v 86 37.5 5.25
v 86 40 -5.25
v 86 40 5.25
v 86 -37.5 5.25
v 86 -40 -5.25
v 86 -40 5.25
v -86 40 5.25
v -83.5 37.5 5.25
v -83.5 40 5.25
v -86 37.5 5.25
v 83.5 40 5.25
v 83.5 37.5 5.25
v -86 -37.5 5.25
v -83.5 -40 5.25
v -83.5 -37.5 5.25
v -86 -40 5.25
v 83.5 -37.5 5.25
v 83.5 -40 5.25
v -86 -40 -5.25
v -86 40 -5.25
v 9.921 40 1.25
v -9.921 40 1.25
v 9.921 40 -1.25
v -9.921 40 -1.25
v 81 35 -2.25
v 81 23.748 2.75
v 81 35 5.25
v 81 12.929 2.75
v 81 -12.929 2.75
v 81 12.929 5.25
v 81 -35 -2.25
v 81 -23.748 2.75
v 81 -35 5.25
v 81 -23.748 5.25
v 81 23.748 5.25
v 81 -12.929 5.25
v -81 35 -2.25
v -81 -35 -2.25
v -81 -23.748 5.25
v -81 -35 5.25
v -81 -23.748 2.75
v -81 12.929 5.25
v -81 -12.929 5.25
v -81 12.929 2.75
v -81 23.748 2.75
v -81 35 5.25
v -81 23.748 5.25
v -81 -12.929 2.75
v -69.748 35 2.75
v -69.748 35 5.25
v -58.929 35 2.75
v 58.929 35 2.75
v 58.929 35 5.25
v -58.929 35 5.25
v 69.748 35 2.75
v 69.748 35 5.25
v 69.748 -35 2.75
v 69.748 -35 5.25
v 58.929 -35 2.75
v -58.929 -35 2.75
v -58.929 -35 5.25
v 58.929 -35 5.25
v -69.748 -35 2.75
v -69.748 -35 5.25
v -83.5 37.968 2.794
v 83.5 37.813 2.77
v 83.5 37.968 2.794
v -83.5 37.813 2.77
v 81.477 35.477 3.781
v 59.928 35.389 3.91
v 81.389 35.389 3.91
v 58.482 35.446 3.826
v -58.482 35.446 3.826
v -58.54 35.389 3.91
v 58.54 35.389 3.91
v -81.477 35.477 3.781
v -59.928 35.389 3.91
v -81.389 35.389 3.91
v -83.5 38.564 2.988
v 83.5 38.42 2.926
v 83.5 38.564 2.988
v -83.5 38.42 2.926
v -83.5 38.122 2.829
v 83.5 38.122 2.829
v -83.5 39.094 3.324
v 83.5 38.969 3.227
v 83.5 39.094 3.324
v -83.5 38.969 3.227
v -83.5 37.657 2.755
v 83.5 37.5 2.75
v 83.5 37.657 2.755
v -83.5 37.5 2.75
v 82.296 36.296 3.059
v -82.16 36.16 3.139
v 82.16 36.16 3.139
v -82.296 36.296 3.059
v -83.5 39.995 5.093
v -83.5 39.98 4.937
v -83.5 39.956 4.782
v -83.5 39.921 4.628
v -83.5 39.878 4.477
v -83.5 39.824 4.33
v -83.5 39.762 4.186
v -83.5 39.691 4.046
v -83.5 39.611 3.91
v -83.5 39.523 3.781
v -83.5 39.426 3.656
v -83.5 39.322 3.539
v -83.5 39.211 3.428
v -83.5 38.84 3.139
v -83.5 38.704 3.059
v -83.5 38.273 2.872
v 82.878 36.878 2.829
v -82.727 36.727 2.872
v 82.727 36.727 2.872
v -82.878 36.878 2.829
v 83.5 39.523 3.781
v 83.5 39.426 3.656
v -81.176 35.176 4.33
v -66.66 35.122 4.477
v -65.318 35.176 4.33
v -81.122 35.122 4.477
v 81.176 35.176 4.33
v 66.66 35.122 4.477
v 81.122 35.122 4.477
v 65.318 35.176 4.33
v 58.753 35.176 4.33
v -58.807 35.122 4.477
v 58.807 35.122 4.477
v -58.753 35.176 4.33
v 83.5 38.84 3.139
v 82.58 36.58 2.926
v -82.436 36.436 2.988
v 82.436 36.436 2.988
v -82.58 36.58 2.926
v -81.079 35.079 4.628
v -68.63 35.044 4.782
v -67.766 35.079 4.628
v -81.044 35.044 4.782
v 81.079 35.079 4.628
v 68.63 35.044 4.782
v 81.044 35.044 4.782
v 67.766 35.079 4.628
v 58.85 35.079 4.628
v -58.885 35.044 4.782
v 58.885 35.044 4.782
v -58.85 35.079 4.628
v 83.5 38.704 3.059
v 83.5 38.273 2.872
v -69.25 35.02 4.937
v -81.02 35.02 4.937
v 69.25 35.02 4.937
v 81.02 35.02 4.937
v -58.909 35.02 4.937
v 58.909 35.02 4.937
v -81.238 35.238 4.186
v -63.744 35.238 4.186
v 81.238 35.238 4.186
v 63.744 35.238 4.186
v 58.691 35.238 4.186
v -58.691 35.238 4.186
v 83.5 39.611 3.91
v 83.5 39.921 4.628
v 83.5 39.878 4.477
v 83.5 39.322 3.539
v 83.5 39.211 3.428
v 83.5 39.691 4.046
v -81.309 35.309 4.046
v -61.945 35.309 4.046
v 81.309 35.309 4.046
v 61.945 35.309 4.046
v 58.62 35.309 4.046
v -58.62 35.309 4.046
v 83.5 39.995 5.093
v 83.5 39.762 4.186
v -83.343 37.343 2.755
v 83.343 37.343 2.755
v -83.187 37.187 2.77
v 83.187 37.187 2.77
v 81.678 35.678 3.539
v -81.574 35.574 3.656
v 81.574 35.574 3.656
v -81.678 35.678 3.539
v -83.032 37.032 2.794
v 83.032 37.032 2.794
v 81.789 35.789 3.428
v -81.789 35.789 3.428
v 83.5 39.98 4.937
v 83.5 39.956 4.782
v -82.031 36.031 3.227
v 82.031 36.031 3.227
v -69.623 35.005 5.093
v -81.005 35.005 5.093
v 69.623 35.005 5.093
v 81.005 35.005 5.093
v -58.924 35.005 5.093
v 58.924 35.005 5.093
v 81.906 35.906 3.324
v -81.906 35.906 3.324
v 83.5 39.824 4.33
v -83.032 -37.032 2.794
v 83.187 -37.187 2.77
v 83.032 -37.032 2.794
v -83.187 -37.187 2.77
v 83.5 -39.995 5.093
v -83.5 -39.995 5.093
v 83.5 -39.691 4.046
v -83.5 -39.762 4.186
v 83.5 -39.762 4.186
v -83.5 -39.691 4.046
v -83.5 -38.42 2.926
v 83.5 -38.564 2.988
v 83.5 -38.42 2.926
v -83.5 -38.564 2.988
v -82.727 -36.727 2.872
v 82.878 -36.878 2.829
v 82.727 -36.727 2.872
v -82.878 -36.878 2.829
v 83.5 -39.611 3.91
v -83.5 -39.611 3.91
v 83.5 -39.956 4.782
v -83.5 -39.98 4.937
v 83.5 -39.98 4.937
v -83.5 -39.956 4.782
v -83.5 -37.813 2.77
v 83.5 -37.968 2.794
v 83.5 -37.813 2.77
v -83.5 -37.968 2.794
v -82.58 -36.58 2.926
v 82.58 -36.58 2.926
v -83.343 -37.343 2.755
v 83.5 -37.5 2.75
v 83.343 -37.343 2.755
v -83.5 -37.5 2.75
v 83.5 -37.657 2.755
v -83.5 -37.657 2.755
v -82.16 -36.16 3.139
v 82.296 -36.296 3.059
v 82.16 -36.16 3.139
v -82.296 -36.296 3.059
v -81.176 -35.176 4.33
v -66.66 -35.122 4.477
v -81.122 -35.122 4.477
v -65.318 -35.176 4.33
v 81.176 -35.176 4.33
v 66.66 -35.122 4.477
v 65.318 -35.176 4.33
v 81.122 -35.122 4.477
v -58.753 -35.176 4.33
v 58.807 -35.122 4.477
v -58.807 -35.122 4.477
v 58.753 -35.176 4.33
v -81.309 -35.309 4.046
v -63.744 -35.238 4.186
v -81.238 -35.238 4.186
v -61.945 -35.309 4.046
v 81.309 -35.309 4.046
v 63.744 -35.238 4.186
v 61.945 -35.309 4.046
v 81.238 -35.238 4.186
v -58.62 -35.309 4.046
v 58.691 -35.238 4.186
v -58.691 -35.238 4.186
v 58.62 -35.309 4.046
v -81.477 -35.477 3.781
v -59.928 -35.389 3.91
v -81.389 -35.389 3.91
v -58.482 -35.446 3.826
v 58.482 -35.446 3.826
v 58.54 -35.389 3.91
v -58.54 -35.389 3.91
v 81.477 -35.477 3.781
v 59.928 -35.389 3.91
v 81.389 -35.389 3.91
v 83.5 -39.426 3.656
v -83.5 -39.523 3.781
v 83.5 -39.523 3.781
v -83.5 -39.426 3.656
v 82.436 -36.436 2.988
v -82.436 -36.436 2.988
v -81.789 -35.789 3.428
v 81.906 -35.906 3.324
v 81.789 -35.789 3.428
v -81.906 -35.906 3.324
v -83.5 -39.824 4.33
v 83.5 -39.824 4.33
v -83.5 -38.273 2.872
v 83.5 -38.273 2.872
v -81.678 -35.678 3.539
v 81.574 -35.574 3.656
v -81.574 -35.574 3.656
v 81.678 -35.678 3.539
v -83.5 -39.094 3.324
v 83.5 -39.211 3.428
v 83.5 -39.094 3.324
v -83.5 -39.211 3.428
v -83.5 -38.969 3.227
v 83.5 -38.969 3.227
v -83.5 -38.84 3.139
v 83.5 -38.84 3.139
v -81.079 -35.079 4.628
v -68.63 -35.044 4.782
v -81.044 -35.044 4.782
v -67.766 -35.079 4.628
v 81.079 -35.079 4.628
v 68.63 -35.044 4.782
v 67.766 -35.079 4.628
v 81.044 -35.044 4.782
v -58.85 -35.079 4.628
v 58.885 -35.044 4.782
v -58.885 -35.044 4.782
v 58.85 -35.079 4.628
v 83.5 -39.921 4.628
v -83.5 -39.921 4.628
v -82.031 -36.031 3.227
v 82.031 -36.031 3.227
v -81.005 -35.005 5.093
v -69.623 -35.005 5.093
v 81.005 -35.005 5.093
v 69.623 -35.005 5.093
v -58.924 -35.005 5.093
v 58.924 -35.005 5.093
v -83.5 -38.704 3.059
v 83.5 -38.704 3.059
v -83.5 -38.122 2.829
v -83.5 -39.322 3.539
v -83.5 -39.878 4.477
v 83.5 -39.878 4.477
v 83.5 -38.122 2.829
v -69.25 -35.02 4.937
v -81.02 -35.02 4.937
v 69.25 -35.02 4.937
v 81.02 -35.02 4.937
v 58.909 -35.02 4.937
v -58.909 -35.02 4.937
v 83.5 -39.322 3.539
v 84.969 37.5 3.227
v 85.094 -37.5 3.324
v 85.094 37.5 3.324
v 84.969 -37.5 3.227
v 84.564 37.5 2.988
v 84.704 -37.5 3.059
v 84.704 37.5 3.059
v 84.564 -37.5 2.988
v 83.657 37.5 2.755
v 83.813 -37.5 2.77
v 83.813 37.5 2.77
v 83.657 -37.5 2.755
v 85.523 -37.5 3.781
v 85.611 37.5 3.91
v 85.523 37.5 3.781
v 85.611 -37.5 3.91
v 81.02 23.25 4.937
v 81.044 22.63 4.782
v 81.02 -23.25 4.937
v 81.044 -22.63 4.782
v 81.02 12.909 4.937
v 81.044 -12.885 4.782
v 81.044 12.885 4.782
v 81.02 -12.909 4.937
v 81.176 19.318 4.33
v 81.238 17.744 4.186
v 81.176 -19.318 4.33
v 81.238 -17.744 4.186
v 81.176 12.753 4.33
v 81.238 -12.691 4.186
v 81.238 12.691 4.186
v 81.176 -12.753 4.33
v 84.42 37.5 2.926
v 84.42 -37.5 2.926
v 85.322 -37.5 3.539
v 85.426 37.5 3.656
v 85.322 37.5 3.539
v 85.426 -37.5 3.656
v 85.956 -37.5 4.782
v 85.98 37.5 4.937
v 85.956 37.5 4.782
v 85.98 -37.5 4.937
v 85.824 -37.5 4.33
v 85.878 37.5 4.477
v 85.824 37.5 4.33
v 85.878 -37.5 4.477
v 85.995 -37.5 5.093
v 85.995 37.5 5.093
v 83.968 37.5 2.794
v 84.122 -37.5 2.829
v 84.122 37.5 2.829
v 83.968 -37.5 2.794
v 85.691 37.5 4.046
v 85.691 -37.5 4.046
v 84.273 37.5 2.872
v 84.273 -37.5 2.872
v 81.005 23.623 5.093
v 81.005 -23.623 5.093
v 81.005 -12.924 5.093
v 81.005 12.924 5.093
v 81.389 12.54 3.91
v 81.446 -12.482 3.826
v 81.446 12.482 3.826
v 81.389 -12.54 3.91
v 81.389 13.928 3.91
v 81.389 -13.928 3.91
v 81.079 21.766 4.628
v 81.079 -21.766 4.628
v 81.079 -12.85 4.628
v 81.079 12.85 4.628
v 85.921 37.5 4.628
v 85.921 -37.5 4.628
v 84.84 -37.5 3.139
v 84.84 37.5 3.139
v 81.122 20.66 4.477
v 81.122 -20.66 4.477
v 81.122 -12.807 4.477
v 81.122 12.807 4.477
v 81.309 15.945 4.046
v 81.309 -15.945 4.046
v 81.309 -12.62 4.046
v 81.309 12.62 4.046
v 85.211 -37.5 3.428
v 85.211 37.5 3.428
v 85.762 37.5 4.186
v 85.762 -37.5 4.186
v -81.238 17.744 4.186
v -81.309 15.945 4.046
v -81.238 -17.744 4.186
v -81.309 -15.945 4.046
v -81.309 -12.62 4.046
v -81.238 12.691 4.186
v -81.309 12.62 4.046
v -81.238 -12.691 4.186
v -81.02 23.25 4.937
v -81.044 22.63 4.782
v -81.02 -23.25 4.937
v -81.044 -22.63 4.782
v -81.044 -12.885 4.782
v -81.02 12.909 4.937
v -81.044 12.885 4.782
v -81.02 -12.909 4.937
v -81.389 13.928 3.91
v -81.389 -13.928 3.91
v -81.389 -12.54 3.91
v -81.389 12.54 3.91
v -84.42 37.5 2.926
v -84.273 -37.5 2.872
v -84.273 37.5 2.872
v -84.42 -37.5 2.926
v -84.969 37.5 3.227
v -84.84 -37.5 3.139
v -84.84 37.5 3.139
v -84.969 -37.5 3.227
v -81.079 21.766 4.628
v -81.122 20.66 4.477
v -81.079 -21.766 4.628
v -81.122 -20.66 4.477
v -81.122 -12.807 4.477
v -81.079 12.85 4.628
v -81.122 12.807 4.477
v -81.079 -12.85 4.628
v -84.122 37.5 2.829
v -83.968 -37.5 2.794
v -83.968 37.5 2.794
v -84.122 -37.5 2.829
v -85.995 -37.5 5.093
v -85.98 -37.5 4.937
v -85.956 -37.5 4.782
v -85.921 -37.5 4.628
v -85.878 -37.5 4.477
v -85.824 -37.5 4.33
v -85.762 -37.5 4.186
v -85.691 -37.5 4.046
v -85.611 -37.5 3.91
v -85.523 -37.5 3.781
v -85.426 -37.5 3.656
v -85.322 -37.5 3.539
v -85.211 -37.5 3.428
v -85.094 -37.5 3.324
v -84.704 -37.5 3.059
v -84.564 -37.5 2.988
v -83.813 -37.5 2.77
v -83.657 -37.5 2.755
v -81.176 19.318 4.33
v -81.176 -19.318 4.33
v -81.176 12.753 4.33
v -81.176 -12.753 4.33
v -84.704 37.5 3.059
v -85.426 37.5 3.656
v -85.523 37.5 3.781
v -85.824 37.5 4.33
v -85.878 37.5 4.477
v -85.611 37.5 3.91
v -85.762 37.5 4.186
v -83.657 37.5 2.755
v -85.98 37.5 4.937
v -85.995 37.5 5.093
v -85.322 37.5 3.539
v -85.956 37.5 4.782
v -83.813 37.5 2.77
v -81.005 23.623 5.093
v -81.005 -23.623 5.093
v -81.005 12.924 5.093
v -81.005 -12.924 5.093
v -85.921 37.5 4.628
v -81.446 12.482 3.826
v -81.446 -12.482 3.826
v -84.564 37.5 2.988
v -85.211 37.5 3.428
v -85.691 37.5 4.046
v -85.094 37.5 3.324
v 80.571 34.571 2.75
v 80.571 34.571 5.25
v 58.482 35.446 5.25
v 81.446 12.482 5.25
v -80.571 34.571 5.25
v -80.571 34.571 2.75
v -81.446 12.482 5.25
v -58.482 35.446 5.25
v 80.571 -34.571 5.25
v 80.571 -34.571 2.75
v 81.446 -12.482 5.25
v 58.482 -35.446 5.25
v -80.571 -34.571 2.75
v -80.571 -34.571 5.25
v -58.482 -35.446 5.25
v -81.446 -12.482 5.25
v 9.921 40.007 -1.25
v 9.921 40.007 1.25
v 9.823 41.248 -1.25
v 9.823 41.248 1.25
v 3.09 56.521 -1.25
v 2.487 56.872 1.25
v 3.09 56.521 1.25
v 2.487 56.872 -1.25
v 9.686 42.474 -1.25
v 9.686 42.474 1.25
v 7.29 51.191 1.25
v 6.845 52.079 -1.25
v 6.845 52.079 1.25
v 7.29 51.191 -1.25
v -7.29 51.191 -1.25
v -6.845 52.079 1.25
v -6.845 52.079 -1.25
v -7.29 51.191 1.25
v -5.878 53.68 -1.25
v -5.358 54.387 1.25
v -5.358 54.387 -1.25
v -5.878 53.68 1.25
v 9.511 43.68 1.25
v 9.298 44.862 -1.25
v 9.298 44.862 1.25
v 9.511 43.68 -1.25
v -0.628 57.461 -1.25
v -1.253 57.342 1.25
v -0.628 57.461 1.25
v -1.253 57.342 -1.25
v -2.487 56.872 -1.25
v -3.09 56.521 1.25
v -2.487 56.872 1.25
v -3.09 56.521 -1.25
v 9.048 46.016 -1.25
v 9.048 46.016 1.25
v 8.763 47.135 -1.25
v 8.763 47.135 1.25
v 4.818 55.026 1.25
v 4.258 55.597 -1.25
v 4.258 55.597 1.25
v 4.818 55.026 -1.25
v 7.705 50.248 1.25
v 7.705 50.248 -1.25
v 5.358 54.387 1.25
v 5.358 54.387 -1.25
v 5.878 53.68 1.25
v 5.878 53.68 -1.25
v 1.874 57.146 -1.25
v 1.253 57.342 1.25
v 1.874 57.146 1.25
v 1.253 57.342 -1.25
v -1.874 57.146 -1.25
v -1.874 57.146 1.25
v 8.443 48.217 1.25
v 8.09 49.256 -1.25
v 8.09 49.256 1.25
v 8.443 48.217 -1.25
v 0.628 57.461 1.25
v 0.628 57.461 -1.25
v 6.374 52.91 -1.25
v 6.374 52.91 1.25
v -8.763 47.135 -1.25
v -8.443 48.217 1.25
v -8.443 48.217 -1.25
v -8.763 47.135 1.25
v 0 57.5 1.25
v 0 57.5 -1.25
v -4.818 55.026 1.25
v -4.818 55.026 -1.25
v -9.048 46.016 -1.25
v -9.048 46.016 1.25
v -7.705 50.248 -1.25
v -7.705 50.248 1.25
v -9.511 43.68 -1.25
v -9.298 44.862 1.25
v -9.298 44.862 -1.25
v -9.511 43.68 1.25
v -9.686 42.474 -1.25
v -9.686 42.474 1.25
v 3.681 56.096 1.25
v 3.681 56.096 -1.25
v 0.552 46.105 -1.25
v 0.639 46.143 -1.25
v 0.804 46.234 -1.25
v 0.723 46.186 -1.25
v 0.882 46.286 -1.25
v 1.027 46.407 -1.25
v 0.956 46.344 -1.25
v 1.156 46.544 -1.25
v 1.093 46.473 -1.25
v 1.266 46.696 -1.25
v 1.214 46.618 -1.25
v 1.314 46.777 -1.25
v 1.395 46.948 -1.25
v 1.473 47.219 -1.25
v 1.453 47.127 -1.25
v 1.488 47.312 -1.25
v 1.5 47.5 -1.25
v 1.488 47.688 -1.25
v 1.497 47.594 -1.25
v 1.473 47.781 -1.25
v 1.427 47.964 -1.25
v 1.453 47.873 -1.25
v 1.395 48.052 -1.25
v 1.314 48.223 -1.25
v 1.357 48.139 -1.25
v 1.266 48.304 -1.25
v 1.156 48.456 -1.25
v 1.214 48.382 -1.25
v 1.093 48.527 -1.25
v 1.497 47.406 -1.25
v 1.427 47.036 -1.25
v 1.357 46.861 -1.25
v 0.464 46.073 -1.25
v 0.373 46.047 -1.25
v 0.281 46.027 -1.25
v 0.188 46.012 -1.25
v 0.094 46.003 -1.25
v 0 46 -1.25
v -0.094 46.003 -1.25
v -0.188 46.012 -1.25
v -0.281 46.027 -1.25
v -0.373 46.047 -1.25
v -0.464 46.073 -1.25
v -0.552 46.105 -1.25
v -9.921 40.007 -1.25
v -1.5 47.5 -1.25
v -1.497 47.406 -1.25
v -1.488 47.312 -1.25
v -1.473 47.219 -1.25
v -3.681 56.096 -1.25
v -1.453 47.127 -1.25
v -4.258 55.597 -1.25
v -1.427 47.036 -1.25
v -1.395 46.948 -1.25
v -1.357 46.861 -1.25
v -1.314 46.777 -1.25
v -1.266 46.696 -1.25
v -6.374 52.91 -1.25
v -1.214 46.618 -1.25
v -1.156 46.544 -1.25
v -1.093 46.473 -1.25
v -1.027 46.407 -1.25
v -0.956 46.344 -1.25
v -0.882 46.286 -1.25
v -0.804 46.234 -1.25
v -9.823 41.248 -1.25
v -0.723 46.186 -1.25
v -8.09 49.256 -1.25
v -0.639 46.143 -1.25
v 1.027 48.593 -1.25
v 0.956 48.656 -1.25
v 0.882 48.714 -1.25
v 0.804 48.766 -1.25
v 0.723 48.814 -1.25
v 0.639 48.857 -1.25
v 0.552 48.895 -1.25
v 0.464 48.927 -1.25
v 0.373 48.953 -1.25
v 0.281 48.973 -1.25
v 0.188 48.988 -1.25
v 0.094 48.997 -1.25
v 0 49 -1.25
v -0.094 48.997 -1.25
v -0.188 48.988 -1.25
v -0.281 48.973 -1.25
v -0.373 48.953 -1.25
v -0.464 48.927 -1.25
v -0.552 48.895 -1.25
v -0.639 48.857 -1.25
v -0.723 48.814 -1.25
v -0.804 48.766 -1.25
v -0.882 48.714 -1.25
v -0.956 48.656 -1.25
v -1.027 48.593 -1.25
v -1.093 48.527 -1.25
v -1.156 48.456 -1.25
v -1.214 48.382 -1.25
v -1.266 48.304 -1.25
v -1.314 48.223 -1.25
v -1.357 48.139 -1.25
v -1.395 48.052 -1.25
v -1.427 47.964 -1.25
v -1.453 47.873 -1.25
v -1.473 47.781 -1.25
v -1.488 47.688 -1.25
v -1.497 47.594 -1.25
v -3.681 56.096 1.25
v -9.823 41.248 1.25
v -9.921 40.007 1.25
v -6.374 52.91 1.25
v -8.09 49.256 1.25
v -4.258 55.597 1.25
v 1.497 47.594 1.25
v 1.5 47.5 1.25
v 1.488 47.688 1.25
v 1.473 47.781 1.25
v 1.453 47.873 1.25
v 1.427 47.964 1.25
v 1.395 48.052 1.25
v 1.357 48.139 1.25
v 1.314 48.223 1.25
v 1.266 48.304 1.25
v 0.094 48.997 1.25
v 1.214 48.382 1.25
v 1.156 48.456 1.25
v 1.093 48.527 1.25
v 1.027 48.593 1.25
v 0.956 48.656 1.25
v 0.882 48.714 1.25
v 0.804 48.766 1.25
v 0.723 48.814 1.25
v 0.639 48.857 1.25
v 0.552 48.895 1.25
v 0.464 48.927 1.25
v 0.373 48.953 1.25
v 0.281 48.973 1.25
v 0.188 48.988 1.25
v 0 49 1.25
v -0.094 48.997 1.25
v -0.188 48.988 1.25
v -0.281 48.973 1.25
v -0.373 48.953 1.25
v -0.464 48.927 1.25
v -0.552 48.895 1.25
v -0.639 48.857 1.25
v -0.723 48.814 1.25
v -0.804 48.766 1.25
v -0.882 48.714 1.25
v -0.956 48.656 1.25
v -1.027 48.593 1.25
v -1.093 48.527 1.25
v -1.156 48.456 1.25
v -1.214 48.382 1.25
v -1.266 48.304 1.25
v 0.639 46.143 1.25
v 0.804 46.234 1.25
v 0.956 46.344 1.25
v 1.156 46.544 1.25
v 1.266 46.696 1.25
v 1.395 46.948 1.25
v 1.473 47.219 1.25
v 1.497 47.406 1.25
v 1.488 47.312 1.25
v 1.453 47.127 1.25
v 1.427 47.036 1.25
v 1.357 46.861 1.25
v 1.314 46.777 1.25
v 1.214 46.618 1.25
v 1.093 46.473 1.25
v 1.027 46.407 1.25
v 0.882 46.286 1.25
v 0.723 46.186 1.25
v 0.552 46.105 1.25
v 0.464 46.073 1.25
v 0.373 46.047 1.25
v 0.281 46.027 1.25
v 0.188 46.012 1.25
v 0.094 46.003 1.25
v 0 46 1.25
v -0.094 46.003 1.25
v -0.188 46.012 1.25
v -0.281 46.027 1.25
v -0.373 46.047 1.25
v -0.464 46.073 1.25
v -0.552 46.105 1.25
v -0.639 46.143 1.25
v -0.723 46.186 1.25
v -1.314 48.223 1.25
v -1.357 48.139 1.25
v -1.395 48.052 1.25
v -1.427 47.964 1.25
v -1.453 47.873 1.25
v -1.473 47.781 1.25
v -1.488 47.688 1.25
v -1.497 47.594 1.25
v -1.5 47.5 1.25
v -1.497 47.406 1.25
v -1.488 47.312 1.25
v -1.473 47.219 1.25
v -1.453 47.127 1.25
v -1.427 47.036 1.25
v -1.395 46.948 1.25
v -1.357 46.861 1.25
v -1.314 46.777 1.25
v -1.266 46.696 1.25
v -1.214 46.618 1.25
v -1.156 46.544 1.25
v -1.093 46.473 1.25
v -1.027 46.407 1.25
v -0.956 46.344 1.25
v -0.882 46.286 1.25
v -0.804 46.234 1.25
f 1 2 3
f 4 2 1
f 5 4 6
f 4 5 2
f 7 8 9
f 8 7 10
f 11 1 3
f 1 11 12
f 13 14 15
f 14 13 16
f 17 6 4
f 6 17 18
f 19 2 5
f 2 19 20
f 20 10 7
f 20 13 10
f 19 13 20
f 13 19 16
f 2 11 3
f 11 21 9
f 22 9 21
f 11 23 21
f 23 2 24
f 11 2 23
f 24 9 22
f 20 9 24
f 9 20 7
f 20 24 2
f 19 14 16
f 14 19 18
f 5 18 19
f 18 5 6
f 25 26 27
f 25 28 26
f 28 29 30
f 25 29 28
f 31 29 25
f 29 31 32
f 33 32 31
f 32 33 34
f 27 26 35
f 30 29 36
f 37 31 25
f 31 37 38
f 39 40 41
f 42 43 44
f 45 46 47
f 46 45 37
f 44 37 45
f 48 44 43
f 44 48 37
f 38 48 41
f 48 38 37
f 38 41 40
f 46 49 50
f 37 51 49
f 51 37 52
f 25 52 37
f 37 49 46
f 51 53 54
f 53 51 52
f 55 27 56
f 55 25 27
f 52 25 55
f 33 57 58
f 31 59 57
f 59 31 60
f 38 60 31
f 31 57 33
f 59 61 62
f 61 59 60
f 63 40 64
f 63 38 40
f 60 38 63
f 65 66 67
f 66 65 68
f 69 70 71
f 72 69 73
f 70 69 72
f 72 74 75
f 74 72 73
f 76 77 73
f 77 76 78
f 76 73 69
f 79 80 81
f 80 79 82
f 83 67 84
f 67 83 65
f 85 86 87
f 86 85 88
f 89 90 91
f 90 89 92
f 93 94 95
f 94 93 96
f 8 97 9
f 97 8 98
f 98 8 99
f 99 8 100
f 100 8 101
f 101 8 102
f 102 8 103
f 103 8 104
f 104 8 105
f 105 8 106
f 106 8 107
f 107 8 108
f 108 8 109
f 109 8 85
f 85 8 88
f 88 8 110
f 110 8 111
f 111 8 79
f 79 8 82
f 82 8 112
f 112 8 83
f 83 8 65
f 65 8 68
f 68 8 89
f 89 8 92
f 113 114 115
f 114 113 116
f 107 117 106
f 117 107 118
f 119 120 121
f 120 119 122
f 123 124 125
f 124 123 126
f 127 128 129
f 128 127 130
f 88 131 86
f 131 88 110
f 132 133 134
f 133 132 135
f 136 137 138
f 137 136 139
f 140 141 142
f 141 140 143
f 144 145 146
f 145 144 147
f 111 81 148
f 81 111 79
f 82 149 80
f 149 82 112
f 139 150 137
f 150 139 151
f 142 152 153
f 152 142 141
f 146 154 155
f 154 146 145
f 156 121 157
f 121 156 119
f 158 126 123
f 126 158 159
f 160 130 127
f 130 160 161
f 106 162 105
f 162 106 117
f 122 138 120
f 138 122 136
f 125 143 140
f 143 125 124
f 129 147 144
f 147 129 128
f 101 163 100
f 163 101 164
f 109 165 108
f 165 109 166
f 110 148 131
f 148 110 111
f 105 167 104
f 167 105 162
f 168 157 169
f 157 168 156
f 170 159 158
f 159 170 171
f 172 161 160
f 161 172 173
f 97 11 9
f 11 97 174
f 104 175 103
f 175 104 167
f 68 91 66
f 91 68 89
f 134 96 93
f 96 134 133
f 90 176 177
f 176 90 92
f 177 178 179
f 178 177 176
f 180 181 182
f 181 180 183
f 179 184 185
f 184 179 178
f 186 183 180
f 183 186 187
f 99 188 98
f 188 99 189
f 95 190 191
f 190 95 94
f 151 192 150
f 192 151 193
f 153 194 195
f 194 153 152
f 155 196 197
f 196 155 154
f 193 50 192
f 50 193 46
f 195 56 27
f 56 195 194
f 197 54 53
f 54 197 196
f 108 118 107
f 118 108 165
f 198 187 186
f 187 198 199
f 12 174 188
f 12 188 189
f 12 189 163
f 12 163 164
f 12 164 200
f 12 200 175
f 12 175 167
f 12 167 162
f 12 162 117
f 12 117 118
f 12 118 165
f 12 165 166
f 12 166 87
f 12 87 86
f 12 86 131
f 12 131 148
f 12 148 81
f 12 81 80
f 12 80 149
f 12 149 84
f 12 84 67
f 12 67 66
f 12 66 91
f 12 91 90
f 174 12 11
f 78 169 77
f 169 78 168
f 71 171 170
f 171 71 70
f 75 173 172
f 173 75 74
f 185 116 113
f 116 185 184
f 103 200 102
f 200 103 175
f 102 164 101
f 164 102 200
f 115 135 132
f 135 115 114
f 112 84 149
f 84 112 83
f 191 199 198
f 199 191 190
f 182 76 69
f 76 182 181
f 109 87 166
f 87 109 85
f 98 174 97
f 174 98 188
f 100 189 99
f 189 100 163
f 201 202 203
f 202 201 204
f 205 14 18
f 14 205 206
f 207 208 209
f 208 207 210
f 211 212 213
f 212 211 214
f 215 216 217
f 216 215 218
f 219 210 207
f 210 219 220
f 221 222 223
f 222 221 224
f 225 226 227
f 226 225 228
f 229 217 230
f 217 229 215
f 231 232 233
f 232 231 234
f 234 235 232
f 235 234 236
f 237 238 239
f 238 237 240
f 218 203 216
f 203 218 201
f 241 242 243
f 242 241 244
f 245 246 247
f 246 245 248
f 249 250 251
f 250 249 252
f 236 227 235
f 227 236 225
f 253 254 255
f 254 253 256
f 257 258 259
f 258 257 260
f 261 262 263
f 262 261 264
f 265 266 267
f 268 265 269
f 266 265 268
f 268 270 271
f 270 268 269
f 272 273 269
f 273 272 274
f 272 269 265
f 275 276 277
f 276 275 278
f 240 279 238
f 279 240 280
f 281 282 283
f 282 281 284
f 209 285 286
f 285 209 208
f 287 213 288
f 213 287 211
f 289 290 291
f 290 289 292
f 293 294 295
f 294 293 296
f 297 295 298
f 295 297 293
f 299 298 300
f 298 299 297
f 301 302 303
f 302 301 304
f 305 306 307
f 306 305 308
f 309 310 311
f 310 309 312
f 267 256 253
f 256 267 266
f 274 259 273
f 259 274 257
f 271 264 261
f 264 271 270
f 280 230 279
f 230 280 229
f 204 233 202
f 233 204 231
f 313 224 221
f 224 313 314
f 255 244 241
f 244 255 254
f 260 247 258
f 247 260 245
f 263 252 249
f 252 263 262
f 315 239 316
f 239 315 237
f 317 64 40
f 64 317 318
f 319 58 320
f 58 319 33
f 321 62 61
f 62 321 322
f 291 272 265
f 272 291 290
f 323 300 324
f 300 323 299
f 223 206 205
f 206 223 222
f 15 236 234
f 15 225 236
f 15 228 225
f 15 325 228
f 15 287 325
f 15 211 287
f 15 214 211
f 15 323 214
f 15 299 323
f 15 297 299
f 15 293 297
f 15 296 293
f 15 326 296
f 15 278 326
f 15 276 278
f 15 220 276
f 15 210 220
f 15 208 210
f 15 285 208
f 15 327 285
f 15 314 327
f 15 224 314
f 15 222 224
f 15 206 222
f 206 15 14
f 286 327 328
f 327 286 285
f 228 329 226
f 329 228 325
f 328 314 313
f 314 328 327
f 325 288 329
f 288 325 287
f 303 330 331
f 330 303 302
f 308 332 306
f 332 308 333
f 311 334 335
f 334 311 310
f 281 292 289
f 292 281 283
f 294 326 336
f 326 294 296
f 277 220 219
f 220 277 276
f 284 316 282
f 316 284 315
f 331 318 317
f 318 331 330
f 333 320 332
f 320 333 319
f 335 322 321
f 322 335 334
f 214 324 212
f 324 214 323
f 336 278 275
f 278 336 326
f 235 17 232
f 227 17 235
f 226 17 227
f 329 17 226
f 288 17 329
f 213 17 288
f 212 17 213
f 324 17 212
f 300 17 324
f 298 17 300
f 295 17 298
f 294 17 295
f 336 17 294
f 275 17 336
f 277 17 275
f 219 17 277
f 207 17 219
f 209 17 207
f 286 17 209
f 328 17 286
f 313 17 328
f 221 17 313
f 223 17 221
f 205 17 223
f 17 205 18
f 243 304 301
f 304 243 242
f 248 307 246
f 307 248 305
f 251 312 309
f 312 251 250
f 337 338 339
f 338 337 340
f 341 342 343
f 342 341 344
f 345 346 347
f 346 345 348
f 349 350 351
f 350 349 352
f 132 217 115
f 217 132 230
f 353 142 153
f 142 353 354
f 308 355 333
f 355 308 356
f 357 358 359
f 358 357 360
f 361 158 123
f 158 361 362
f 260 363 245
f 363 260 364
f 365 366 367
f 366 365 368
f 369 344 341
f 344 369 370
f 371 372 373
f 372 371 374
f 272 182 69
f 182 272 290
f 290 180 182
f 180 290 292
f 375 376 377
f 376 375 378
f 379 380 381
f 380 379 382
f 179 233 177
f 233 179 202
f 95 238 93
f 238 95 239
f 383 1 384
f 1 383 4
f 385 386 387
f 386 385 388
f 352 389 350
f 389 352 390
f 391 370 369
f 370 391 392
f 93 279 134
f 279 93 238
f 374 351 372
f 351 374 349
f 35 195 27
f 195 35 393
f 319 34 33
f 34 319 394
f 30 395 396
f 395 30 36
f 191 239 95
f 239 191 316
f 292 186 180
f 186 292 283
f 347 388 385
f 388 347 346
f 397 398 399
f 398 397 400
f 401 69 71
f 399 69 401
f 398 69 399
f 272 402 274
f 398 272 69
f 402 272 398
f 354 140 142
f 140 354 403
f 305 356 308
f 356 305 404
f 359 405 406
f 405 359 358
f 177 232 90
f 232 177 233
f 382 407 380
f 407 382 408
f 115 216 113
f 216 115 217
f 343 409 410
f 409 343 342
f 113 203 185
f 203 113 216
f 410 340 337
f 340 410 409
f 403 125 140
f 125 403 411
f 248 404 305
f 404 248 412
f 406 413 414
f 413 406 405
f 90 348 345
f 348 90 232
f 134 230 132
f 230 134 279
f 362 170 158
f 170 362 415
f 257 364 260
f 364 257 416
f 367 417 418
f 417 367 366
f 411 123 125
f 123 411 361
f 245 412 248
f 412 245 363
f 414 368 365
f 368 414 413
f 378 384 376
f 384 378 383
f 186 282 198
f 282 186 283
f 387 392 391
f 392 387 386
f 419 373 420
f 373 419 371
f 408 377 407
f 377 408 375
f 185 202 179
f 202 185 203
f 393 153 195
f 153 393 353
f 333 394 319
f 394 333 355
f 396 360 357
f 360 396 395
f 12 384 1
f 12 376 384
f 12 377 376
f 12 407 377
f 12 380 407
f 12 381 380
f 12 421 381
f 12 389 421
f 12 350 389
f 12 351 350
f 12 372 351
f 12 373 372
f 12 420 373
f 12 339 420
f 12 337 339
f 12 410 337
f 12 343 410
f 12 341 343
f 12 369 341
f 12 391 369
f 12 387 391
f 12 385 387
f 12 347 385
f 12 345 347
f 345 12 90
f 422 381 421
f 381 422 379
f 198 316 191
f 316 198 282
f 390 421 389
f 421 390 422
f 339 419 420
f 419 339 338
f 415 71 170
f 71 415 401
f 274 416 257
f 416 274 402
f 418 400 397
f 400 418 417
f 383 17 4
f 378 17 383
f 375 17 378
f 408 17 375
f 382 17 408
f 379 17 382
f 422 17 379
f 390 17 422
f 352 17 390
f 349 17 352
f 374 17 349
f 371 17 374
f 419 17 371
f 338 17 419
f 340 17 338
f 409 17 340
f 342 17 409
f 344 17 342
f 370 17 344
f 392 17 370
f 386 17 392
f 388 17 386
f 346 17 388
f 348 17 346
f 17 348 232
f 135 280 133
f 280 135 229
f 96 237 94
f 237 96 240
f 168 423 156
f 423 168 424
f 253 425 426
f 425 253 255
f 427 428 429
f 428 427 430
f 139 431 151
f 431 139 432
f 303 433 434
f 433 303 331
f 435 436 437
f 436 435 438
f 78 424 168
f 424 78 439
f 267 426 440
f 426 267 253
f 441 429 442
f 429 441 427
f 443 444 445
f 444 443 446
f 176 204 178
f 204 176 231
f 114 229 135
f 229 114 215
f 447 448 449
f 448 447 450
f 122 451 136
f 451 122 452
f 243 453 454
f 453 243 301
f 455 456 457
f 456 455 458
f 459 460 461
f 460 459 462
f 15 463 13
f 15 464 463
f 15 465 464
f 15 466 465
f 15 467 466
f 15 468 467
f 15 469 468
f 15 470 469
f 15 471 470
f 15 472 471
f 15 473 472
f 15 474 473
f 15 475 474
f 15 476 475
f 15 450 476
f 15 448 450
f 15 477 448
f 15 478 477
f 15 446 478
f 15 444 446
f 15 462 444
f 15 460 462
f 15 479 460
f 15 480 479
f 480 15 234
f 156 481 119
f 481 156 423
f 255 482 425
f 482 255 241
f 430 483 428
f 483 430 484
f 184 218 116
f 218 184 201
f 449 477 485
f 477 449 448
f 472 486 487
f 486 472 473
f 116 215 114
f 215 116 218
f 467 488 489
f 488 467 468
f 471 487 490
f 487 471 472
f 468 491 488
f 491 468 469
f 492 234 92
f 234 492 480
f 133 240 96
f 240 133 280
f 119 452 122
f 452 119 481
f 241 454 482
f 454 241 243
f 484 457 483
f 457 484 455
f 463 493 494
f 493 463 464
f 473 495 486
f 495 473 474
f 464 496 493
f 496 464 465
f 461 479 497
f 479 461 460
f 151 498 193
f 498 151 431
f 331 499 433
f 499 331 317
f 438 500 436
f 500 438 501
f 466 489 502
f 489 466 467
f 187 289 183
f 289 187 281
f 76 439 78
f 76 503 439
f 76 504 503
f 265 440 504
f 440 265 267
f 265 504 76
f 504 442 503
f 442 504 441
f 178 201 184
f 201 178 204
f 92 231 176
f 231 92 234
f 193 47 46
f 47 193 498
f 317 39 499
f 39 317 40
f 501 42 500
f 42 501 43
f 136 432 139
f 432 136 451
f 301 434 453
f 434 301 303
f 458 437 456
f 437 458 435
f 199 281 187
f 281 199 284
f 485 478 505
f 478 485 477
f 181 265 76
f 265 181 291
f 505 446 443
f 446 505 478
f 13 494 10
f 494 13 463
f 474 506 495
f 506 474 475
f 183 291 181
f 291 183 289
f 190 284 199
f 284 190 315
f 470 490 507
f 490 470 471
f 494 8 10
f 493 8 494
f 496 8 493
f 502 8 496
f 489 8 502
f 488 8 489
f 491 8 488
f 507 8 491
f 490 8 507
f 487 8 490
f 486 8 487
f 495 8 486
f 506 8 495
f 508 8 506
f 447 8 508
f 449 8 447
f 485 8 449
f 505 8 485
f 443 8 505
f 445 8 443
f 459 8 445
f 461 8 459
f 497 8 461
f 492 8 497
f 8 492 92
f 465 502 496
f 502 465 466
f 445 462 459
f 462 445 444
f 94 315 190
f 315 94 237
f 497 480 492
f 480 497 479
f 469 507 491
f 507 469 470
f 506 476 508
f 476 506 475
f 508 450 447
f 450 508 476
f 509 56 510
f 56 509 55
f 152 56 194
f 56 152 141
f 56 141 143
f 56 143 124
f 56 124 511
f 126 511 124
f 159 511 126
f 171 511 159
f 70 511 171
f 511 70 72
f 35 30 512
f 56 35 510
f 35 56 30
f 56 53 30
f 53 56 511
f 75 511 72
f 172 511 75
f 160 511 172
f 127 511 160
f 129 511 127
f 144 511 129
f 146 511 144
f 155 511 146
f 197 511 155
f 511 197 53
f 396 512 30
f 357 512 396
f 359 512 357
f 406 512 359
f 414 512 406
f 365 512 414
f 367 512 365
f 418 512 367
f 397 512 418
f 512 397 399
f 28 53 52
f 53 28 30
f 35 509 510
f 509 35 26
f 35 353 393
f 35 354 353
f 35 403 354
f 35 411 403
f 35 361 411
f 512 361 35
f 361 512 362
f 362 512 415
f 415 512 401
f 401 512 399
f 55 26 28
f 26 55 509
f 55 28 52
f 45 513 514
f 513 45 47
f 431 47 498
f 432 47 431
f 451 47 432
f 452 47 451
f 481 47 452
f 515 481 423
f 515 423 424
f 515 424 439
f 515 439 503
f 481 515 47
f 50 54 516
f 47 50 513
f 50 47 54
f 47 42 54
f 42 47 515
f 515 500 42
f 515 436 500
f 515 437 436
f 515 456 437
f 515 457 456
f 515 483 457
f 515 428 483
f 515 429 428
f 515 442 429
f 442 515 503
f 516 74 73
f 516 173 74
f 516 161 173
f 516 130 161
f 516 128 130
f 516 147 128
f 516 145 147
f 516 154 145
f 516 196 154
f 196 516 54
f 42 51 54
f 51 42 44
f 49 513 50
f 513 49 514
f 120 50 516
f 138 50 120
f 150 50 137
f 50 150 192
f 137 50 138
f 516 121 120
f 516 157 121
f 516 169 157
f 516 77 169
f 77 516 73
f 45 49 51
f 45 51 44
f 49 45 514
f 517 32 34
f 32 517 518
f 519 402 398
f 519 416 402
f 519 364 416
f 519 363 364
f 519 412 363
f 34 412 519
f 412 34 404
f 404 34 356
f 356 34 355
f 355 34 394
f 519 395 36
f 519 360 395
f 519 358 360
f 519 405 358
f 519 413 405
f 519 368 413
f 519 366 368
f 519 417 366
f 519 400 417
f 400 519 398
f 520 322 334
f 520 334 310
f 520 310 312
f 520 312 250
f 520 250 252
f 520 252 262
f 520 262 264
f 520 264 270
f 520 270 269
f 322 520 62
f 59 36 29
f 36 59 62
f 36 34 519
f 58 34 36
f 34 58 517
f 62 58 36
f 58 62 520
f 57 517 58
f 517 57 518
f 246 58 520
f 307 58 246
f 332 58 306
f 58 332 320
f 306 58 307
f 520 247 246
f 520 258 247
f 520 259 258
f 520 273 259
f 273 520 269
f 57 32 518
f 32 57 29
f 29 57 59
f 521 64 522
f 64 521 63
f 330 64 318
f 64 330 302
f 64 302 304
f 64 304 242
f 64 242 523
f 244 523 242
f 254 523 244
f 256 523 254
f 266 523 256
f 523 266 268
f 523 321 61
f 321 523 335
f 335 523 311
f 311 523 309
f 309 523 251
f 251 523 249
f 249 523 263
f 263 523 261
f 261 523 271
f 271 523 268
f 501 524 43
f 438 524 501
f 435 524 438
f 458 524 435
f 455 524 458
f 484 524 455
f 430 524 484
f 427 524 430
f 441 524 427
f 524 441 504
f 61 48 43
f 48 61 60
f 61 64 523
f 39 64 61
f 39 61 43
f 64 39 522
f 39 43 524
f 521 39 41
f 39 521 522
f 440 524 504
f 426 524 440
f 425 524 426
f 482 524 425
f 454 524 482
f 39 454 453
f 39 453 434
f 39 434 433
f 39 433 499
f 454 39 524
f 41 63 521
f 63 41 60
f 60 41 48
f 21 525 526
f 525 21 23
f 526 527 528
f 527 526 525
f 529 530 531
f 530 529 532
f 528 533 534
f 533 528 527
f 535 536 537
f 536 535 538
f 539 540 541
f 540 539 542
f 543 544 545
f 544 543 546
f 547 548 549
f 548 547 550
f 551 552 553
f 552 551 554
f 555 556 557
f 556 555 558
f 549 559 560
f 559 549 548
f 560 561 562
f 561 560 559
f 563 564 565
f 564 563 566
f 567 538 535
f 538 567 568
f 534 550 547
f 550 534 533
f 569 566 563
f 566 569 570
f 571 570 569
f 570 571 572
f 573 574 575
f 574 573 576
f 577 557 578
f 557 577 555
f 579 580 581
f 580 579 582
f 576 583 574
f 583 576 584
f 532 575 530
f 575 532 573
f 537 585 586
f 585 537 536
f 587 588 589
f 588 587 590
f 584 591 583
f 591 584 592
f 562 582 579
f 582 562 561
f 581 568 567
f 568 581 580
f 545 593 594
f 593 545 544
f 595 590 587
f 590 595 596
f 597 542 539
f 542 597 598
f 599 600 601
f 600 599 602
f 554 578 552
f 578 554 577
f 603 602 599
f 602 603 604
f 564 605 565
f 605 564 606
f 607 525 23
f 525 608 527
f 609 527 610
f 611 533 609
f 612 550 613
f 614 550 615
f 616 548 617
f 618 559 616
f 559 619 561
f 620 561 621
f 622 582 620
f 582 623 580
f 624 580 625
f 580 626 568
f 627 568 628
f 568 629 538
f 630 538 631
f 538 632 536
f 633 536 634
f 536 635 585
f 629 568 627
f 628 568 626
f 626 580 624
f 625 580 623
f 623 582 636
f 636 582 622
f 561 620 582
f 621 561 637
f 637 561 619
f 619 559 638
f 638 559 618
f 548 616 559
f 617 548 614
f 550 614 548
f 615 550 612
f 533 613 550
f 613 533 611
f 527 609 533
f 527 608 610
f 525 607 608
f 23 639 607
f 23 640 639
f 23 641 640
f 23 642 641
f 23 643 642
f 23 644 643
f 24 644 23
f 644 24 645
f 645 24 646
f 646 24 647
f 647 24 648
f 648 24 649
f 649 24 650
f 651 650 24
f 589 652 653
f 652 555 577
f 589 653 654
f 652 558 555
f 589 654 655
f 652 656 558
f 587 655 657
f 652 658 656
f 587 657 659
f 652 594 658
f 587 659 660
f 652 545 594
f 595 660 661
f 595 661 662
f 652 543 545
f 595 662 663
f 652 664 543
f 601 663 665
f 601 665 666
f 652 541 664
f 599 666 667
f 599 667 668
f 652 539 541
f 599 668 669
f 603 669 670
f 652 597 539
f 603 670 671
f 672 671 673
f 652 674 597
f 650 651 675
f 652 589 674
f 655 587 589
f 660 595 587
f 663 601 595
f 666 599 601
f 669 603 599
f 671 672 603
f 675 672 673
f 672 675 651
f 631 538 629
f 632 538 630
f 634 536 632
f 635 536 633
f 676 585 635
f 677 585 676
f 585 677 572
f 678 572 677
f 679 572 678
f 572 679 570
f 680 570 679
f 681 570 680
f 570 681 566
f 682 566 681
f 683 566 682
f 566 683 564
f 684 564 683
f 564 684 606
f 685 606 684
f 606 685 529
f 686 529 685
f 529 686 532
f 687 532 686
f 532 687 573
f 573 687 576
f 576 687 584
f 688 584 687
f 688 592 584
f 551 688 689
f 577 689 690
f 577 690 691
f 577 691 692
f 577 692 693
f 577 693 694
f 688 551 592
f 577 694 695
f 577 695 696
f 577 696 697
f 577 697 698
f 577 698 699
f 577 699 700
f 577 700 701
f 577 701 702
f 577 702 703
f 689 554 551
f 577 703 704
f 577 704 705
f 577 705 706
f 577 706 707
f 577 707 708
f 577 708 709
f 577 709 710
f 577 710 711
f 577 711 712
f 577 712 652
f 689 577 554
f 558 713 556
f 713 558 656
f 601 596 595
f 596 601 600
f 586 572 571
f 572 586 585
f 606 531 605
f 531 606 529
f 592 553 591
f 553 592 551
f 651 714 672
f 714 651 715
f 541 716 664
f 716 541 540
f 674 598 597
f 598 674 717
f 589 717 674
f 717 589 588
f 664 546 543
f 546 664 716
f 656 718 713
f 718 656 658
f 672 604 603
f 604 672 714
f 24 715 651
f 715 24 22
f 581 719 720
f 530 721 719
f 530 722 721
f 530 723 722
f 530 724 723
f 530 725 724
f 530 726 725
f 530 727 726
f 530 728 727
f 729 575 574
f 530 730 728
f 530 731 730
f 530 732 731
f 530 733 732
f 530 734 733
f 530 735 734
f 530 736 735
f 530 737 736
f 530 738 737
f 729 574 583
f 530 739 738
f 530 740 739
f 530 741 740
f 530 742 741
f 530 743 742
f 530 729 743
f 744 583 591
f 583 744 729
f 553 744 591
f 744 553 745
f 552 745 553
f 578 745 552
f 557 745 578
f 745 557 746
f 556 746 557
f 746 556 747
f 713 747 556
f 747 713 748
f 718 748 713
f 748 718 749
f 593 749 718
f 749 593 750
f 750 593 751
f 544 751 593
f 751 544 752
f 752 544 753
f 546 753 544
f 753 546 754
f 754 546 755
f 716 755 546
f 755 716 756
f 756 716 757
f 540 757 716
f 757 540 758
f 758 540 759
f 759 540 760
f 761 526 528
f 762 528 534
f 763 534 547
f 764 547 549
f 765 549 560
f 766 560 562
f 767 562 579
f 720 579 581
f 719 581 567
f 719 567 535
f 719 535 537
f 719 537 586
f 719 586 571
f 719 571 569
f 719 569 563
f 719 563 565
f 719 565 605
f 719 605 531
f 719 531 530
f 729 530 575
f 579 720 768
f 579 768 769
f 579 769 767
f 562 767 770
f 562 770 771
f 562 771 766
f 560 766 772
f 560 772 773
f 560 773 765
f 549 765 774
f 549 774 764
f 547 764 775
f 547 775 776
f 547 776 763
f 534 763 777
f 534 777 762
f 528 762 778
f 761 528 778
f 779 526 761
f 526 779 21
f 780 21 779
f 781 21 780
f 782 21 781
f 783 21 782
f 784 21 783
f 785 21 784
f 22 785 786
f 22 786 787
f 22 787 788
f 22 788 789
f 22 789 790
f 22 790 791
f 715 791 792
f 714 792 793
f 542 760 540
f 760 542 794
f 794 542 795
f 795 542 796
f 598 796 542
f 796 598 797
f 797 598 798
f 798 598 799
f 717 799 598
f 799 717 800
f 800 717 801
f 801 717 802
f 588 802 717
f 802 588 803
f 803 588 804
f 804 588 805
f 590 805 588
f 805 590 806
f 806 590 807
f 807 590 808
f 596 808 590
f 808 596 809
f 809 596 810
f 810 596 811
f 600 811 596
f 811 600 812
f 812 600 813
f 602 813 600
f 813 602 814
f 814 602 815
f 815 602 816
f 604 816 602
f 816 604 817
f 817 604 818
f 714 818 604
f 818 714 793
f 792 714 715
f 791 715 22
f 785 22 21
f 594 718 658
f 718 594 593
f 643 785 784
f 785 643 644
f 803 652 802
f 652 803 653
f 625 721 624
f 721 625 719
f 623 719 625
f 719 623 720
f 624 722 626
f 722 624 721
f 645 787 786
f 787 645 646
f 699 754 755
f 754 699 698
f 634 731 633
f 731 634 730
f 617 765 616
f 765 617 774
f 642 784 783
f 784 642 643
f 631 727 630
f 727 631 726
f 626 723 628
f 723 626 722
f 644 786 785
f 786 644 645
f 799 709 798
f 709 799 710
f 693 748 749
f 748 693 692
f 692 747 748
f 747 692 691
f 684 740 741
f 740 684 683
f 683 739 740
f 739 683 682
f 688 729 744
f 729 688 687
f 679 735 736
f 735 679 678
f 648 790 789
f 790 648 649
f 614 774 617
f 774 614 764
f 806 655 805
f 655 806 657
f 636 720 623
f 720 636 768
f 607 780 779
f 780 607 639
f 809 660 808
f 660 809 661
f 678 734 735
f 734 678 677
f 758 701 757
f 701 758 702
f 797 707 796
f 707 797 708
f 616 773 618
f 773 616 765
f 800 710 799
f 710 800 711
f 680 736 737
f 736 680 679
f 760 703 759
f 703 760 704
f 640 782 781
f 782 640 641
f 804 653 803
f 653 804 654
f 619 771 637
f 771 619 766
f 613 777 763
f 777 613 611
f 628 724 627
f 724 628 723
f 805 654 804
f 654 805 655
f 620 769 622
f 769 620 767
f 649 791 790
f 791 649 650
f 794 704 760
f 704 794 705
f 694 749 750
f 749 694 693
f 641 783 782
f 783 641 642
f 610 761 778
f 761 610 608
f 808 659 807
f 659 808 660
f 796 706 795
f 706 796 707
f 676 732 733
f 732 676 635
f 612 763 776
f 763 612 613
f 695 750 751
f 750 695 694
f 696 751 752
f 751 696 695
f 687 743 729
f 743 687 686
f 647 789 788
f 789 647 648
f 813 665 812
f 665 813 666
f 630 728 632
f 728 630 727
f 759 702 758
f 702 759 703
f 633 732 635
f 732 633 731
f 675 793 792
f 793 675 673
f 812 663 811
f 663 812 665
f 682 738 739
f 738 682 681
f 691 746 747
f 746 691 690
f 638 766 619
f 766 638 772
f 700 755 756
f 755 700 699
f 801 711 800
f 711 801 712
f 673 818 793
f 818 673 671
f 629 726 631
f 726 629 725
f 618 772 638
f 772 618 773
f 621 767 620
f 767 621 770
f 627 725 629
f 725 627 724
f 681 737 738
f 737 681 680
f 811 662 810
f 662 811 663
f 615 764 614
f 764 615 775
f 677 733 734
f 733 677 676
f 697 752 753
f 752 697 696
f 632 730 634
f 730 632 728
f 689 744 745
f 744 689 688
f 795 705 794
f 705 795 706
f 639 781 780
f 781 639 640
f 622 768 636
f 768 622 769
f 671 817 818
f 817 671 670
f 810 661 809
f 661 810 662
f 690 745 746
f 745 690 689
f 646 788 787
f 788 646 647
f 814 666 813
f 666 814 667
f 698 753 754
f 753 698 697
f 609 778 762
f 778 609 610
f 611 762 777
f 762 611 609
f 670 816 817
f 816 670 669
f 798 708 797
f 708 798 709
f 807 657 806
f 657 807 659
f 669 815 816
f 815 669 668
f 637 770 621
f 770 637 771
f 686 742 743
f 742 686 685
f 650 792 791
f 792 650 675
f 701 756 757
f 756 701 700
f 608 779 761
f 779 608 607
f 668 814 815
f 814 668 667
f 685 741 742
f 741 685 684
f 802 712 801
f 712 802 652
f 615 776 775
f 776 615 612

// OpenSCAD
//The length of the bill (mm). Don't use exact measurements as, chances are, the thing won't print precisely enough and the bill won't fit, so do round up.
billLength = 162;

//l (mm). Don't use exact measurements as, chances are, the thing won't print precisely enough 
//The width of the biland the bill won't fit, so do round up.
billWidth = 70;

//The thickness of the bill. This SHOULD NOT be an exact measurement and you're completely fine using more space (within reason).
billThick = 5;

//The thickness of the frame length-wise.
frameThickX = 5;

//The thickness of the frame width-wise.
frameThickY = 5;

//The style of the frameshaping cut. A value between 1 and 2 is reccomended. This is how much the frame shaping modules overlap, and it works either way. Default is 1, but you might not like the look so do as you please.
frameShapeStyle = 1;

//The additional thickness of the frame (top to bottom-wise), independent from the bottom and the slot for the bill.
frameThick = 3;

//The thickness of the bottom piece of the frame.
botThick = 2.5;

//The thickness of of the frame triangles.
triangleThick = 2.5;

//The length ("diameter") of the triangles.
triangleLength = 20;

//The width of the triangles.
triangleWidth = 37.5;

//Mode 1 is to have the triangles on the outside corners on the frame, mode 3 is to have triangles on the inner corners of the frame. Had to skip mode 2 just because of how the math works out.
triangleMode = 3;

//Total length of the hook. 
hookLength = 20;

//Total width of the hook
hookWidth = 20;

//Total thickness of the hook.
hookThick = 2.5;

//The size of the hole for the hook.
hookHole = 3;

//The length up from the center the hole should be.
hookHoleUp = 0;

//The detail on all circular objects in the model.
sfn = 100;

//The amount extra to cut through things. Used many times here.
extraCut = 1;


module frame() {
    difference() {
        //The length + the border of the  frame, the width + the border of the frame + the total thickness including the thickness of the bottom, the middle (for the bill) and the thickness of the general frame. Multiply both frame thicknesses for two so both sides have that thickness.
        cube([billLength + frameThickX*2, billWidth + frameThickY*2, frameThick+botThick+billThick], center=true);
        //Moves the frame up to cut through everything except the thickness reserved for the bottom. Saves a step.
        translate([0,0,botThick/2+1]) {
            //The insides that need to be hollowed out, being "subtracted" from the whole piece.
            cube([billLength, billWidth,  frameThick+billThick+1], center=true);
        }
    }
}




module frameShapeX() {
    //Rotate the cylinder that cuts into the frame from a "soup can" or "water bottle" orientation to a "rolling log" type of orientation.
    rotate([0,90,0]) {
        //The size of the frame exactly. The height is the new "length" of the cylinder because it's flipped on its side, so it needs  to be the size of the bill in that directions plus the frame thickness to go all the way. All the way looks different than all the way minus a little bit and they offer different aesthetics, hence why there is a "frameShapeStyle" variable, adjustible above to change the level of overlap of the two cylinders.
        cylinder(r=frameThickX/2, h=billLength+frameThickX*frameShapeStyle, center=true, $fn=sfn);
    }
}
module frameShapeY() {
       //Rotate the cylinder that cuts into the frame from a "soup can" or "water bottle" orientation to a "rolling log" type of orientation.
    rotate([90,0,0]) {
        //The size of the frame exactly. The height is the new "length" of the cylinder because it's flipped on its side, so it needs  to be the size of the bill in that directions plus the frame thickness to go all the way. All the way looks different than all the way minus a little bit and they offer different aesthetics, hence why there is a "frameShapeStyle" variable, adjustible above to change the level of overlap of the two cylinders.
        cylinder(r=frameThickY/2, h=billWidth+frameThickY*frameShapeStyle, center=true, $fn=sfn);
    }
}


module frameTriangle() {
    scale([1,triangleWidth/triangleLength, 1]) {
        cylinder(r=triangleLength/2, h=triangleThick, center=true, $fn=3);
    }
}

module frameShapingX() {
    //Moving the frame to the edge of the frame. Since I don't want the edge of the frame shaping cylinder to be on the edge of the bill, I don't translate it an additional frameThickY/2 to compensate for the size of the cylinder.
    translate([0,(billWidth+frameThickY)/2,(billThick+botThick+frameThick)/2]) {
        frameShapeX();
    }
    //Moving the frame to the edge of the frame. Since I don't want the edge of the frame shaping cylinder to be on the edge of the bill, I don't translate it an additional frameThickX/2 to compensate for the size of the cylinder.
    translate([0,(billWidth+frameThickY)/-2,(billThick+botThick+frameThick)/2]) {
        frameShapeX();
    }
}

module frameShapingY() {
    translate([(billLength+frameThickX)/2,0,(billThick+botThick+frameThick)/2]) {
        frameShapeY();
    }
    translate([(billLength+frameThickX)/-2,0/-2,(billThick+botThick+frameThick)/2]) {
        frameShapeY();
    }
}


module frameTriangles() {
    //For all of these blocks of text in this module, we're moving the triangles to either the outside or inside corners, decided by the triangle mode variable above, and rotating them so that they are in the correct orientation for their respective corners.
    translate([(billLength-frameThickX*triangleMode)/2,(billWidth-frameThickY*triangleMode)/2, (billThick+botThick+frameThick-triangleThick)/2]) {
        rotate([0,0,45]) {
            frameTriangle();
        }
        
    }
    translate([(billLength-frameThickX*triangleMode)/-2,(billWidth-frameThickY*triangleMode)/2, (billThick+botThick+frameThick-triangleThick)/2]) {
        rotate([0,0,135]) {
            frameTriangle();
        }
        
    }
    
    translate([(billLength-frameThickX*triangleMode)/2,(billWidth-frameThickY*triangleMode)/-2, (billThick+botThick+frameThick-triangleThick)/2]) {
        rotate([0,0,315]) {
            frameTriangle();
        }
        
    }
    translate([(billLength-frameThickX*triangleMode)/-2,(billWidth-frameThickY*triangleMode)/-2, (billThick+botThick+frameThick-triangleThick)/2]) {
        rotate([0,0,225]) {
            frameTriangle();
        }
        
    }
}
module shapedFrame() {
    //Subtracting all of the shaping of the frame from the frame itself.
    difference() {
        frame();
        frameShapingX();
        frameShapingY();
    }
}


module hook() {
    //Moving the hook to the edge of the frame.
    translate([0,(billWidth+frameThickY)/2,0]) {
        //Only using half of the hook by cutting off half of it. 
        difference() {
            //Scaling the cylinder up based on the ratio between length and width.
            scale([1,hookLength*2/hookWidth, 1]) {
                //A cylinder for the hook based on the variables above. 
                cylinder(r=hookWidth/2, h=hookThick, center=true, $fn=sfn);
            }
            //Moving the part to cut over.
            translate([0,hookLength/-2,0]) {
                //Added extracut for a clean cut.
                cube([hookWidth+extraCut,hookLength, hookThick+extraCut], center=true);
            }
            translate([0,hookLength/2+hookHoleUp,0]) {
                cylinder(r=hookHole/2, h=hookThick+extraCut, center=true, $fn=sfn);
        }
        }
    }
}

module fullFrame() {
    shapedFrame();
    frameTriangles();
    hook();

}

fullFrame();
